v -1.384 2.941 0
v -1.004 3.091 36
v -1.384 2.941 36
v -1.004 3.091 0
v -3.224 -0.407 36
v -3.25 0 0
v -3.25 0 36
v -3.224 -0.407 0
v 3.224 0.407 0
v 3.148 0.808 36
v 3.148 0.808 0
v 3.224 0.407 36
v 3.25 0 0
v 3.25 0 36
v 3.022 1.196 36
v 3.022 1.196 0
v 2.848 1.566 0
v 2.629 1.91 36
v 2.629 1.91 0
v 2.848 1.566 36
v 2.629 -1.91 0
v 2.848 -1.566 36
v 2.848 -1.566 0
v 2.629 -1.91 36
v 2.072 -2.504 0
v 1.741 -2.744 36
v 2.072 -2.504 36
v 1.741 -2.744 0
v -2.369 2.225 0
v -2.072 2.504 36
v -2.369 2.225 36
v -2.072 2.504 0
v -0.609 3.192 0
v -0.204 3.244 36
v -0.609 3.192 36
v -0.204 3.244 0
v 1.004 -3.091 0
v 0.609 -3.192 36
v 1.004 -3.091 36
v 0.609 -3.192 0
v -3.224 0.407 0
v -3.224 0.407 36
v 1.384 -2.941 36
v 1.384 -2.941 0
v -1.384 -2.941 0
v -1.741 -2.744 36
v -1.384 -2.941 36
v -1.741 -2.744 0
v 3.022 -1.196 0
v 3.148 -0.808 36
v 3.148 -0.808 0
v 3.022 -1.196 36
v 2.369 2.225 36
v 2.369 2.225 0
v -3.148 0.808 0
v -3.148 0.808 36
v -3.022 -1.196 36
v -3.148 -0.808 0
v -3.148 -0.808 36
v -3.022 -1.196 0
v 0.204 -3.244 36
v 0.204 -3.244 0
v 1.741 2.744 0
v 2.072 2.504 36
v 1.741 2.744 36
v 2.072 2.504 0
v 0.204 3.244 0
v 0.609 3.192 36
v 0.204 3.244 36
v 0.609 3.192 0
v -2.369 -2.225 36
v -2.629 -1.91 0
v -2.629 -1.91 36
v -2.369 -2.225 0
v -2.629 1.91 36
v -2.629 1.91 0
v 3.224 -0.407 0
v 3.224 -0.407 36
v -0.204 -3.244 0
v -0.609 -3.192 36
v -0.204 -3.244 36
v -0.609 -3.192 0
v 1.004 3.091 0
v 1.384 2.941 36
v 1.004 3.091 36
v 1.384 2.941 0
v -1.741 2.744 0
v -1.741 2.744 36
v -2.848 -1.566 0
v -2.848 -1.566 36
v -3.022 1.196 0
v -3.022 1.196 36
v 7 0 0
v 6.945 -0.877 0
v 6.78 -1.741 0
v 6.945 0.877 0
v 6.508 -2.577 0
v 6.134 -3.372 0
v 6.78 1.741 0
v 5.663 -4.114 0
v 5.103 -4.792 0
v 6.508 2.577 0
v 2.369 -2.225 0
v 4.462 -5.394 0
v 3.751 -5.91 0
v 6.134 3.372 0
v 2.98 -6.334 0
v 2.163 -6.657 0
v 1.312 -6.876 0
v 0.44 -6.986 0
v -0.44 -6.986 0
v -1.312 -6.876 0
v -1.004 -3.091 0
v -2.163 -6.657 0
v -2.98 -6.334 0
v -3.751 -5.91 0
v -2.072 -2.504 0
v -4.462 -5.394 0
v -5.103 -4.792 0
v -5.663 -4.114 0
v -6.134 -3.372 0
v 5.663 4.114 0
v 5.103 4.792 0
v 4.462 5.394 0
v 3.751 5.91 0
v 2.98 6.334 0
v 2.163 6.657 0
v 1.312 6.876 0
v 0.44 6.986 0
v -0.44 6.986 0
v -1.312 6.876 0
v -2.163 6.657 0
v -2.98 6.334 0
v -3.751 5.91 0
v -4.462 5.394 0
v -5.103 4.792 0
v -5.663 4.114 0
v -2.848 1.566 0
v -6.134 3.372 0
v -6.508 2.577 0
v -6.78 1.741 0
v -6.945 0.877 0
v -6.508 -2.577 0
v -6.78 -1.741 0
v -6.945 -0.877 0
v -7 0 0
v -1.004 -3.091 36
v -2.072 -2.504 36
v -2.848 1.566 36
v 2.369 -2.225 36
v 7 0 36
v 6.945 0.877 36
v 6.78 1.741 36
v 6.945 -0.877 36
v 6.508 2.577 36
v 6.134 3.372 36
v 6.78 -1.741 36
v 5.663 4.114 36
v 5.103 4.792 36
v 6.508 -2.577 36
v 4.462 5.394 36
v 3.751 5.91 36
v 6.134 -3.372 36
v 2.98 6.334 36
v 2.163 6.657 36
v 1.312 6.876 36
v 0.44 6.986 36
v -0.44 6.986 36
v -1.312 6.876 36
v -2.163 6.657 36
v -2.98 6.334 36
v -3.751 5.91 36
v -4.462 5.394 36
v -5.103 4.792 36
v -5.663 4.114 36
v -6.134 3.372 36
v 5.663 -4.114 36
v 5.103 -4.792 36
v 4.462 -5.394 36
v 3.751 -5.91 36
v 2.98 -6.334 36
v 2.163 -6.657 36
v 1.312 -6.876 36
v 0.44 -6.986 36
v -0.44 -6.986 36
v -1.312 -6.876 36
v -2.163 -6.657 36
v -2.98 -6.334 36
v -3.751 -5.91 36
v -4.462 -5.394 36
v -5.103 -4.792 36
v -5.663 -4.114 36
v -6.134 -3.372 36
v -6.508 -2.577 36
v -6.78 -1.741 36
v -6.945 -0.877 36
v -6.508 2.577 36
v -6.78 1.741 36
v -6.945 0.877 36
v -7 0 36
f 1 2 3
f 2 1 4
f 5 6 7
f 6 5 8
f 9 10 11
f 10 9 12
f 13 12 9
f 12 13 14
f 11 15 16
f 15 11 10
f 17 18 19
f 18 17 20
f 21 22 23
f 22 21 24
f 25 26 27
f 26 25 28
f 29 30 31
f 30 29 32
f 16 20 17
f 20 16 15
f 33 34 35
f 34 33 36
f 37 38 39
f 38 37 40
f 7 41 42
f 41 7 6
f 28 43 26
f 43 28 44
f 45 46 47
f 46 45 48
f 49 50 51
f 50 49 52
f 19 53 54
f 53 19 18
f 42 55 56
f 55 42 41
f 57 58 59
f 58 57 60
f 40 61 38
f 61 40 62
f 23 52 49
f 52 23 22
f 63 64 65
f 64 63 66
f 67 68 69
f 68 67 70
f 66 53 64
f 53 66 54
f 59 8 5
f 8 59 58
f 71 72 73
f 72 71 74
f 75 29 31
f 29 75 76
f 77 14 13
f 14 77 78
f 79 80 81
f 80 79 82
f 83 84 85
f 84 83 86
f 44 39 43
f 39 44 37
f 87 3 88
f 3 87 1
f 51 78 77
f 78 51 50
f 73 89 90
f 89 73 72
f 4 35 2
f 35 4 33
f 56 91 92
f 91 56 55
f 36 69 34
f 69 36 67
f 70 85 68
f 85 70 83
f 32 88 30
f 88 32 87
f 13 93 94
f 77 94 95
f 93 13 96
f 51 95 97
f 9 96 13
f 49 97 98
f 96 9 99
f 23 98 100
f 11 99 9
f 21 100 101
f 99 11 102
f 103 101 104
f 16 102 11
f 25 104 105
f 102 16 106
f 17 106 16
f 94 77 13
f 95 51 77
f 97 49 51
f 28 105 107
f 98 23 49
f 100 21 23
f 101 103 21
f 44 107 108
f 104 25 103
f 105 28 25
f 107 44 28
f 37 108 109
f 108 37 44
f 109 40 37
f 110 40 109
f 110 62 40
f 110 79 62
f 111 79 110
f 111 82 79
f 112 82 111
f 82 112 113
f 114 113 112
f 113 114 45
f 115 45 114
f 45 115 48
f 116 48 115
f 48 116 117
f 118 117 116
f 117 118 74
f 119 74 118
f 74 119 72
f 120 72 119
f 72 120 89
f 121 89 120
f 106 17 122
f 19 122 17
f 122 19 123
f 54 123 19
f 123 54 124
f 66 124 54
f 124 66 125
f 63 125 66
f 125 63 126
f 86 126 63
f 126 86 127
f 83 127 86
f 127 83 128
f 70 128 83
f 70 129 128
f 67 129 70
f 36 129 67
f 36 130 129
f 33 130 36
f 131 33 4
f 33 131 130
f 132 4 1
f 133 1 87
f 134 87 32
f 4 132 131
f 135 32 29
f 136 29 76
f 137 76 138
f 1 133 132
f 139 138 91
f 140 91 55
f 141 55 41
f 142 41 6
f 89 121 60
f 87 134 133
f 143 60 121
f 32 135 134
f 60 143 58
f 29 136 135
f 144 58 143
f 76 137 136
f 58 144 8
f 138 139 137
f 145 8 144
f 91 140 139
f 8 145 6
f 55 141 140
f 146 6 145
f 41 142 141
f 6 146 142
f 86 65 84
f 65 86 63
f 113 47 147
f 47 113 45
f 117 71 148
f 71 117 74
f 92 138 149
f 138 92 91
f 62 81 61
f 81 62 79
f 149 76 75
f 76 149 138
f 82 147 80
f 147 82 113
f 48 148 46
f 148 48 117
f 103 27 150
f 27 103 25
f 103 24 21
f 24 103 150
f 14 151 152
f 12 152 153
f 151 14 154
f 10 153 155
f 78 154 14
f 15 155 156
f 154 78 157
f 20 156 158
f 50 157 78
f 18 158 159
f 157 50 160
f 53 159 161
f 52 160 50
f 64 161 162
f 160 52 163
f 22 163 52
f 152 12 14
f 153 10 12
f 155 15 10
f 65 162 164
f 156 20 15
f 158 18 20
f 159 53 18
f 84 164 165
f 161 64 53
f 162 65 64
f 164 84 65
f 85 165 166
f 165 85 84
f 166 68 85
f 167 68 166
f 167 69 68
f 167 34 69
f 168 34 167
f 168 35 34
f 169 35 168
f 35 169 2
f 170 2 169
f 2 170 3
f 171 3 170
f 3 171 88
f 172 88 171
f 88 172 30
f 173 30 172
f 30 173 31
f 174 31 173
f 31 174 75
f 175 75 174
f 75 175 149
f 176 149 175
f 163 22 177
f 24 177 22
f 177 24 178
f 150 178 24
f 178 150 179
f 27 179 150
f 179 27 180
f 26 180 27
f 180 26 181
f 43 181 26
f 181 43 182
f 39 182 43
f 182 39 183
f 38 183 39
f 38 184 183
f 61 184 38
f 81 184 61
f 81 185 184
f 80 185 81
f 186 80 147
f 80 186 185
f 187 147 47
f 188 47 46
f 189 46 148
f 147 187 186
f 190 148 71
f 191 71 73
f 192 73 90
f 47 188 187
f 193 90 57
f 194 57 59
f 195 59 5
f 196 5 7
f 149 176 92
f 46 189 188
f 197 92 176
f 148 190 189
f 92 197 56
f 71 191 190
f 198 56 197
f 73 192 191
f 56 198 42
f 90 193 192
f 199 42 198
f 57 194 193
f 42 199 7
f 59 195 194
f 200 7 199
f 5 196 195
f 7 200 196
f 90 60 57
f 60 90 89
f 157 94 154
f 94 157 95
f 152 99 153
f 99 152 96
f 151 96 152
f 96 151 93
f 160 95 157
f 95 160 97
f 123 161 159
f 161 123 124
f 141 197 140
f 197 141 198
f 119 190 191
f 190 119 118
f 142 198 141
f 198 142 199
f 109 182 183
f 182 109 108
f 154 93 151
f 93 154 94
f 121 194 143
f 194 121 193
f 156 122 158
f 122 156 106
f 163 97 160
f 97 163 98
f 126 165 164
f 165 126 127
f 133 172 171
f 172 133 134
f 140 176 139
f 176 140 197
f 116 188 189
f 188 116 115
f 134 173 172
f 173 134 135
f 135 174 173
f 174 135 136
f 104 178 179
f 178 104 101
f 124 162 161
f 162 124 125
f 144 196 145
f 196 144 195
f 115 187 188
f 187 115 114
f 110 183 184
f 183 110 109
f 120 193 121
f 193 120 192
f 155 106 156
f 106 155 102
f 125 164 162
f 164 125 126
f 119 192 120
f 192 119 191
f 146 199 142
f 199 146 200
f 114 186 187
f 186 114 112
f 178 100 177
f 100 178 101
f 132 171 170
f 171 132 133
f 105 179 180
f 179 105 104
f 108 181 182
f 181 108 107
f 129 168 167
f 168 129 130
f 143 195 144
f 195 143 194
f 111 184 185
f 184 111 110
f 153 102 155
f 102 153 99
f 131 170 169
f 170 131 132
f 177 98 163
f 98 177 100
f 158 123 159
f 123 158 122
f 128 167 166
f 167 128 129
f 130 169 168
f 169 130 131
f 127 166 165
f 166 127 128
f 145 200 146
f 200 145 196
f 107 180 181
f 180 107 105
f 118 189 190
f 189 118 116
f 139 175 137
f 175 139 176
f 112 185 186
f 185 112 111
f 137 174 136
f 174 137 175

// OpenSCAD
$fn = 50;


difference() {
	union() {
		cylinder(h = 36, r = 7.0000000000);
	}
	union() {
		cylinder(h = 36, r = 3.2500000000);
		cylinder(h = 36, r = 3.2500000000);
		cylinder(h = 36, r = 1.8000000000);
		cylinder(h = 36, r = 1.8000000000);
		cylinder(h = 36, r = 1.8000000000);
		cylinder(h = 36, r = 1.8000000000);
		cylinder(h = 36, r = 1.8000000000);
		cylinder(h = 36, r = 1.8000000000);
	}
}
